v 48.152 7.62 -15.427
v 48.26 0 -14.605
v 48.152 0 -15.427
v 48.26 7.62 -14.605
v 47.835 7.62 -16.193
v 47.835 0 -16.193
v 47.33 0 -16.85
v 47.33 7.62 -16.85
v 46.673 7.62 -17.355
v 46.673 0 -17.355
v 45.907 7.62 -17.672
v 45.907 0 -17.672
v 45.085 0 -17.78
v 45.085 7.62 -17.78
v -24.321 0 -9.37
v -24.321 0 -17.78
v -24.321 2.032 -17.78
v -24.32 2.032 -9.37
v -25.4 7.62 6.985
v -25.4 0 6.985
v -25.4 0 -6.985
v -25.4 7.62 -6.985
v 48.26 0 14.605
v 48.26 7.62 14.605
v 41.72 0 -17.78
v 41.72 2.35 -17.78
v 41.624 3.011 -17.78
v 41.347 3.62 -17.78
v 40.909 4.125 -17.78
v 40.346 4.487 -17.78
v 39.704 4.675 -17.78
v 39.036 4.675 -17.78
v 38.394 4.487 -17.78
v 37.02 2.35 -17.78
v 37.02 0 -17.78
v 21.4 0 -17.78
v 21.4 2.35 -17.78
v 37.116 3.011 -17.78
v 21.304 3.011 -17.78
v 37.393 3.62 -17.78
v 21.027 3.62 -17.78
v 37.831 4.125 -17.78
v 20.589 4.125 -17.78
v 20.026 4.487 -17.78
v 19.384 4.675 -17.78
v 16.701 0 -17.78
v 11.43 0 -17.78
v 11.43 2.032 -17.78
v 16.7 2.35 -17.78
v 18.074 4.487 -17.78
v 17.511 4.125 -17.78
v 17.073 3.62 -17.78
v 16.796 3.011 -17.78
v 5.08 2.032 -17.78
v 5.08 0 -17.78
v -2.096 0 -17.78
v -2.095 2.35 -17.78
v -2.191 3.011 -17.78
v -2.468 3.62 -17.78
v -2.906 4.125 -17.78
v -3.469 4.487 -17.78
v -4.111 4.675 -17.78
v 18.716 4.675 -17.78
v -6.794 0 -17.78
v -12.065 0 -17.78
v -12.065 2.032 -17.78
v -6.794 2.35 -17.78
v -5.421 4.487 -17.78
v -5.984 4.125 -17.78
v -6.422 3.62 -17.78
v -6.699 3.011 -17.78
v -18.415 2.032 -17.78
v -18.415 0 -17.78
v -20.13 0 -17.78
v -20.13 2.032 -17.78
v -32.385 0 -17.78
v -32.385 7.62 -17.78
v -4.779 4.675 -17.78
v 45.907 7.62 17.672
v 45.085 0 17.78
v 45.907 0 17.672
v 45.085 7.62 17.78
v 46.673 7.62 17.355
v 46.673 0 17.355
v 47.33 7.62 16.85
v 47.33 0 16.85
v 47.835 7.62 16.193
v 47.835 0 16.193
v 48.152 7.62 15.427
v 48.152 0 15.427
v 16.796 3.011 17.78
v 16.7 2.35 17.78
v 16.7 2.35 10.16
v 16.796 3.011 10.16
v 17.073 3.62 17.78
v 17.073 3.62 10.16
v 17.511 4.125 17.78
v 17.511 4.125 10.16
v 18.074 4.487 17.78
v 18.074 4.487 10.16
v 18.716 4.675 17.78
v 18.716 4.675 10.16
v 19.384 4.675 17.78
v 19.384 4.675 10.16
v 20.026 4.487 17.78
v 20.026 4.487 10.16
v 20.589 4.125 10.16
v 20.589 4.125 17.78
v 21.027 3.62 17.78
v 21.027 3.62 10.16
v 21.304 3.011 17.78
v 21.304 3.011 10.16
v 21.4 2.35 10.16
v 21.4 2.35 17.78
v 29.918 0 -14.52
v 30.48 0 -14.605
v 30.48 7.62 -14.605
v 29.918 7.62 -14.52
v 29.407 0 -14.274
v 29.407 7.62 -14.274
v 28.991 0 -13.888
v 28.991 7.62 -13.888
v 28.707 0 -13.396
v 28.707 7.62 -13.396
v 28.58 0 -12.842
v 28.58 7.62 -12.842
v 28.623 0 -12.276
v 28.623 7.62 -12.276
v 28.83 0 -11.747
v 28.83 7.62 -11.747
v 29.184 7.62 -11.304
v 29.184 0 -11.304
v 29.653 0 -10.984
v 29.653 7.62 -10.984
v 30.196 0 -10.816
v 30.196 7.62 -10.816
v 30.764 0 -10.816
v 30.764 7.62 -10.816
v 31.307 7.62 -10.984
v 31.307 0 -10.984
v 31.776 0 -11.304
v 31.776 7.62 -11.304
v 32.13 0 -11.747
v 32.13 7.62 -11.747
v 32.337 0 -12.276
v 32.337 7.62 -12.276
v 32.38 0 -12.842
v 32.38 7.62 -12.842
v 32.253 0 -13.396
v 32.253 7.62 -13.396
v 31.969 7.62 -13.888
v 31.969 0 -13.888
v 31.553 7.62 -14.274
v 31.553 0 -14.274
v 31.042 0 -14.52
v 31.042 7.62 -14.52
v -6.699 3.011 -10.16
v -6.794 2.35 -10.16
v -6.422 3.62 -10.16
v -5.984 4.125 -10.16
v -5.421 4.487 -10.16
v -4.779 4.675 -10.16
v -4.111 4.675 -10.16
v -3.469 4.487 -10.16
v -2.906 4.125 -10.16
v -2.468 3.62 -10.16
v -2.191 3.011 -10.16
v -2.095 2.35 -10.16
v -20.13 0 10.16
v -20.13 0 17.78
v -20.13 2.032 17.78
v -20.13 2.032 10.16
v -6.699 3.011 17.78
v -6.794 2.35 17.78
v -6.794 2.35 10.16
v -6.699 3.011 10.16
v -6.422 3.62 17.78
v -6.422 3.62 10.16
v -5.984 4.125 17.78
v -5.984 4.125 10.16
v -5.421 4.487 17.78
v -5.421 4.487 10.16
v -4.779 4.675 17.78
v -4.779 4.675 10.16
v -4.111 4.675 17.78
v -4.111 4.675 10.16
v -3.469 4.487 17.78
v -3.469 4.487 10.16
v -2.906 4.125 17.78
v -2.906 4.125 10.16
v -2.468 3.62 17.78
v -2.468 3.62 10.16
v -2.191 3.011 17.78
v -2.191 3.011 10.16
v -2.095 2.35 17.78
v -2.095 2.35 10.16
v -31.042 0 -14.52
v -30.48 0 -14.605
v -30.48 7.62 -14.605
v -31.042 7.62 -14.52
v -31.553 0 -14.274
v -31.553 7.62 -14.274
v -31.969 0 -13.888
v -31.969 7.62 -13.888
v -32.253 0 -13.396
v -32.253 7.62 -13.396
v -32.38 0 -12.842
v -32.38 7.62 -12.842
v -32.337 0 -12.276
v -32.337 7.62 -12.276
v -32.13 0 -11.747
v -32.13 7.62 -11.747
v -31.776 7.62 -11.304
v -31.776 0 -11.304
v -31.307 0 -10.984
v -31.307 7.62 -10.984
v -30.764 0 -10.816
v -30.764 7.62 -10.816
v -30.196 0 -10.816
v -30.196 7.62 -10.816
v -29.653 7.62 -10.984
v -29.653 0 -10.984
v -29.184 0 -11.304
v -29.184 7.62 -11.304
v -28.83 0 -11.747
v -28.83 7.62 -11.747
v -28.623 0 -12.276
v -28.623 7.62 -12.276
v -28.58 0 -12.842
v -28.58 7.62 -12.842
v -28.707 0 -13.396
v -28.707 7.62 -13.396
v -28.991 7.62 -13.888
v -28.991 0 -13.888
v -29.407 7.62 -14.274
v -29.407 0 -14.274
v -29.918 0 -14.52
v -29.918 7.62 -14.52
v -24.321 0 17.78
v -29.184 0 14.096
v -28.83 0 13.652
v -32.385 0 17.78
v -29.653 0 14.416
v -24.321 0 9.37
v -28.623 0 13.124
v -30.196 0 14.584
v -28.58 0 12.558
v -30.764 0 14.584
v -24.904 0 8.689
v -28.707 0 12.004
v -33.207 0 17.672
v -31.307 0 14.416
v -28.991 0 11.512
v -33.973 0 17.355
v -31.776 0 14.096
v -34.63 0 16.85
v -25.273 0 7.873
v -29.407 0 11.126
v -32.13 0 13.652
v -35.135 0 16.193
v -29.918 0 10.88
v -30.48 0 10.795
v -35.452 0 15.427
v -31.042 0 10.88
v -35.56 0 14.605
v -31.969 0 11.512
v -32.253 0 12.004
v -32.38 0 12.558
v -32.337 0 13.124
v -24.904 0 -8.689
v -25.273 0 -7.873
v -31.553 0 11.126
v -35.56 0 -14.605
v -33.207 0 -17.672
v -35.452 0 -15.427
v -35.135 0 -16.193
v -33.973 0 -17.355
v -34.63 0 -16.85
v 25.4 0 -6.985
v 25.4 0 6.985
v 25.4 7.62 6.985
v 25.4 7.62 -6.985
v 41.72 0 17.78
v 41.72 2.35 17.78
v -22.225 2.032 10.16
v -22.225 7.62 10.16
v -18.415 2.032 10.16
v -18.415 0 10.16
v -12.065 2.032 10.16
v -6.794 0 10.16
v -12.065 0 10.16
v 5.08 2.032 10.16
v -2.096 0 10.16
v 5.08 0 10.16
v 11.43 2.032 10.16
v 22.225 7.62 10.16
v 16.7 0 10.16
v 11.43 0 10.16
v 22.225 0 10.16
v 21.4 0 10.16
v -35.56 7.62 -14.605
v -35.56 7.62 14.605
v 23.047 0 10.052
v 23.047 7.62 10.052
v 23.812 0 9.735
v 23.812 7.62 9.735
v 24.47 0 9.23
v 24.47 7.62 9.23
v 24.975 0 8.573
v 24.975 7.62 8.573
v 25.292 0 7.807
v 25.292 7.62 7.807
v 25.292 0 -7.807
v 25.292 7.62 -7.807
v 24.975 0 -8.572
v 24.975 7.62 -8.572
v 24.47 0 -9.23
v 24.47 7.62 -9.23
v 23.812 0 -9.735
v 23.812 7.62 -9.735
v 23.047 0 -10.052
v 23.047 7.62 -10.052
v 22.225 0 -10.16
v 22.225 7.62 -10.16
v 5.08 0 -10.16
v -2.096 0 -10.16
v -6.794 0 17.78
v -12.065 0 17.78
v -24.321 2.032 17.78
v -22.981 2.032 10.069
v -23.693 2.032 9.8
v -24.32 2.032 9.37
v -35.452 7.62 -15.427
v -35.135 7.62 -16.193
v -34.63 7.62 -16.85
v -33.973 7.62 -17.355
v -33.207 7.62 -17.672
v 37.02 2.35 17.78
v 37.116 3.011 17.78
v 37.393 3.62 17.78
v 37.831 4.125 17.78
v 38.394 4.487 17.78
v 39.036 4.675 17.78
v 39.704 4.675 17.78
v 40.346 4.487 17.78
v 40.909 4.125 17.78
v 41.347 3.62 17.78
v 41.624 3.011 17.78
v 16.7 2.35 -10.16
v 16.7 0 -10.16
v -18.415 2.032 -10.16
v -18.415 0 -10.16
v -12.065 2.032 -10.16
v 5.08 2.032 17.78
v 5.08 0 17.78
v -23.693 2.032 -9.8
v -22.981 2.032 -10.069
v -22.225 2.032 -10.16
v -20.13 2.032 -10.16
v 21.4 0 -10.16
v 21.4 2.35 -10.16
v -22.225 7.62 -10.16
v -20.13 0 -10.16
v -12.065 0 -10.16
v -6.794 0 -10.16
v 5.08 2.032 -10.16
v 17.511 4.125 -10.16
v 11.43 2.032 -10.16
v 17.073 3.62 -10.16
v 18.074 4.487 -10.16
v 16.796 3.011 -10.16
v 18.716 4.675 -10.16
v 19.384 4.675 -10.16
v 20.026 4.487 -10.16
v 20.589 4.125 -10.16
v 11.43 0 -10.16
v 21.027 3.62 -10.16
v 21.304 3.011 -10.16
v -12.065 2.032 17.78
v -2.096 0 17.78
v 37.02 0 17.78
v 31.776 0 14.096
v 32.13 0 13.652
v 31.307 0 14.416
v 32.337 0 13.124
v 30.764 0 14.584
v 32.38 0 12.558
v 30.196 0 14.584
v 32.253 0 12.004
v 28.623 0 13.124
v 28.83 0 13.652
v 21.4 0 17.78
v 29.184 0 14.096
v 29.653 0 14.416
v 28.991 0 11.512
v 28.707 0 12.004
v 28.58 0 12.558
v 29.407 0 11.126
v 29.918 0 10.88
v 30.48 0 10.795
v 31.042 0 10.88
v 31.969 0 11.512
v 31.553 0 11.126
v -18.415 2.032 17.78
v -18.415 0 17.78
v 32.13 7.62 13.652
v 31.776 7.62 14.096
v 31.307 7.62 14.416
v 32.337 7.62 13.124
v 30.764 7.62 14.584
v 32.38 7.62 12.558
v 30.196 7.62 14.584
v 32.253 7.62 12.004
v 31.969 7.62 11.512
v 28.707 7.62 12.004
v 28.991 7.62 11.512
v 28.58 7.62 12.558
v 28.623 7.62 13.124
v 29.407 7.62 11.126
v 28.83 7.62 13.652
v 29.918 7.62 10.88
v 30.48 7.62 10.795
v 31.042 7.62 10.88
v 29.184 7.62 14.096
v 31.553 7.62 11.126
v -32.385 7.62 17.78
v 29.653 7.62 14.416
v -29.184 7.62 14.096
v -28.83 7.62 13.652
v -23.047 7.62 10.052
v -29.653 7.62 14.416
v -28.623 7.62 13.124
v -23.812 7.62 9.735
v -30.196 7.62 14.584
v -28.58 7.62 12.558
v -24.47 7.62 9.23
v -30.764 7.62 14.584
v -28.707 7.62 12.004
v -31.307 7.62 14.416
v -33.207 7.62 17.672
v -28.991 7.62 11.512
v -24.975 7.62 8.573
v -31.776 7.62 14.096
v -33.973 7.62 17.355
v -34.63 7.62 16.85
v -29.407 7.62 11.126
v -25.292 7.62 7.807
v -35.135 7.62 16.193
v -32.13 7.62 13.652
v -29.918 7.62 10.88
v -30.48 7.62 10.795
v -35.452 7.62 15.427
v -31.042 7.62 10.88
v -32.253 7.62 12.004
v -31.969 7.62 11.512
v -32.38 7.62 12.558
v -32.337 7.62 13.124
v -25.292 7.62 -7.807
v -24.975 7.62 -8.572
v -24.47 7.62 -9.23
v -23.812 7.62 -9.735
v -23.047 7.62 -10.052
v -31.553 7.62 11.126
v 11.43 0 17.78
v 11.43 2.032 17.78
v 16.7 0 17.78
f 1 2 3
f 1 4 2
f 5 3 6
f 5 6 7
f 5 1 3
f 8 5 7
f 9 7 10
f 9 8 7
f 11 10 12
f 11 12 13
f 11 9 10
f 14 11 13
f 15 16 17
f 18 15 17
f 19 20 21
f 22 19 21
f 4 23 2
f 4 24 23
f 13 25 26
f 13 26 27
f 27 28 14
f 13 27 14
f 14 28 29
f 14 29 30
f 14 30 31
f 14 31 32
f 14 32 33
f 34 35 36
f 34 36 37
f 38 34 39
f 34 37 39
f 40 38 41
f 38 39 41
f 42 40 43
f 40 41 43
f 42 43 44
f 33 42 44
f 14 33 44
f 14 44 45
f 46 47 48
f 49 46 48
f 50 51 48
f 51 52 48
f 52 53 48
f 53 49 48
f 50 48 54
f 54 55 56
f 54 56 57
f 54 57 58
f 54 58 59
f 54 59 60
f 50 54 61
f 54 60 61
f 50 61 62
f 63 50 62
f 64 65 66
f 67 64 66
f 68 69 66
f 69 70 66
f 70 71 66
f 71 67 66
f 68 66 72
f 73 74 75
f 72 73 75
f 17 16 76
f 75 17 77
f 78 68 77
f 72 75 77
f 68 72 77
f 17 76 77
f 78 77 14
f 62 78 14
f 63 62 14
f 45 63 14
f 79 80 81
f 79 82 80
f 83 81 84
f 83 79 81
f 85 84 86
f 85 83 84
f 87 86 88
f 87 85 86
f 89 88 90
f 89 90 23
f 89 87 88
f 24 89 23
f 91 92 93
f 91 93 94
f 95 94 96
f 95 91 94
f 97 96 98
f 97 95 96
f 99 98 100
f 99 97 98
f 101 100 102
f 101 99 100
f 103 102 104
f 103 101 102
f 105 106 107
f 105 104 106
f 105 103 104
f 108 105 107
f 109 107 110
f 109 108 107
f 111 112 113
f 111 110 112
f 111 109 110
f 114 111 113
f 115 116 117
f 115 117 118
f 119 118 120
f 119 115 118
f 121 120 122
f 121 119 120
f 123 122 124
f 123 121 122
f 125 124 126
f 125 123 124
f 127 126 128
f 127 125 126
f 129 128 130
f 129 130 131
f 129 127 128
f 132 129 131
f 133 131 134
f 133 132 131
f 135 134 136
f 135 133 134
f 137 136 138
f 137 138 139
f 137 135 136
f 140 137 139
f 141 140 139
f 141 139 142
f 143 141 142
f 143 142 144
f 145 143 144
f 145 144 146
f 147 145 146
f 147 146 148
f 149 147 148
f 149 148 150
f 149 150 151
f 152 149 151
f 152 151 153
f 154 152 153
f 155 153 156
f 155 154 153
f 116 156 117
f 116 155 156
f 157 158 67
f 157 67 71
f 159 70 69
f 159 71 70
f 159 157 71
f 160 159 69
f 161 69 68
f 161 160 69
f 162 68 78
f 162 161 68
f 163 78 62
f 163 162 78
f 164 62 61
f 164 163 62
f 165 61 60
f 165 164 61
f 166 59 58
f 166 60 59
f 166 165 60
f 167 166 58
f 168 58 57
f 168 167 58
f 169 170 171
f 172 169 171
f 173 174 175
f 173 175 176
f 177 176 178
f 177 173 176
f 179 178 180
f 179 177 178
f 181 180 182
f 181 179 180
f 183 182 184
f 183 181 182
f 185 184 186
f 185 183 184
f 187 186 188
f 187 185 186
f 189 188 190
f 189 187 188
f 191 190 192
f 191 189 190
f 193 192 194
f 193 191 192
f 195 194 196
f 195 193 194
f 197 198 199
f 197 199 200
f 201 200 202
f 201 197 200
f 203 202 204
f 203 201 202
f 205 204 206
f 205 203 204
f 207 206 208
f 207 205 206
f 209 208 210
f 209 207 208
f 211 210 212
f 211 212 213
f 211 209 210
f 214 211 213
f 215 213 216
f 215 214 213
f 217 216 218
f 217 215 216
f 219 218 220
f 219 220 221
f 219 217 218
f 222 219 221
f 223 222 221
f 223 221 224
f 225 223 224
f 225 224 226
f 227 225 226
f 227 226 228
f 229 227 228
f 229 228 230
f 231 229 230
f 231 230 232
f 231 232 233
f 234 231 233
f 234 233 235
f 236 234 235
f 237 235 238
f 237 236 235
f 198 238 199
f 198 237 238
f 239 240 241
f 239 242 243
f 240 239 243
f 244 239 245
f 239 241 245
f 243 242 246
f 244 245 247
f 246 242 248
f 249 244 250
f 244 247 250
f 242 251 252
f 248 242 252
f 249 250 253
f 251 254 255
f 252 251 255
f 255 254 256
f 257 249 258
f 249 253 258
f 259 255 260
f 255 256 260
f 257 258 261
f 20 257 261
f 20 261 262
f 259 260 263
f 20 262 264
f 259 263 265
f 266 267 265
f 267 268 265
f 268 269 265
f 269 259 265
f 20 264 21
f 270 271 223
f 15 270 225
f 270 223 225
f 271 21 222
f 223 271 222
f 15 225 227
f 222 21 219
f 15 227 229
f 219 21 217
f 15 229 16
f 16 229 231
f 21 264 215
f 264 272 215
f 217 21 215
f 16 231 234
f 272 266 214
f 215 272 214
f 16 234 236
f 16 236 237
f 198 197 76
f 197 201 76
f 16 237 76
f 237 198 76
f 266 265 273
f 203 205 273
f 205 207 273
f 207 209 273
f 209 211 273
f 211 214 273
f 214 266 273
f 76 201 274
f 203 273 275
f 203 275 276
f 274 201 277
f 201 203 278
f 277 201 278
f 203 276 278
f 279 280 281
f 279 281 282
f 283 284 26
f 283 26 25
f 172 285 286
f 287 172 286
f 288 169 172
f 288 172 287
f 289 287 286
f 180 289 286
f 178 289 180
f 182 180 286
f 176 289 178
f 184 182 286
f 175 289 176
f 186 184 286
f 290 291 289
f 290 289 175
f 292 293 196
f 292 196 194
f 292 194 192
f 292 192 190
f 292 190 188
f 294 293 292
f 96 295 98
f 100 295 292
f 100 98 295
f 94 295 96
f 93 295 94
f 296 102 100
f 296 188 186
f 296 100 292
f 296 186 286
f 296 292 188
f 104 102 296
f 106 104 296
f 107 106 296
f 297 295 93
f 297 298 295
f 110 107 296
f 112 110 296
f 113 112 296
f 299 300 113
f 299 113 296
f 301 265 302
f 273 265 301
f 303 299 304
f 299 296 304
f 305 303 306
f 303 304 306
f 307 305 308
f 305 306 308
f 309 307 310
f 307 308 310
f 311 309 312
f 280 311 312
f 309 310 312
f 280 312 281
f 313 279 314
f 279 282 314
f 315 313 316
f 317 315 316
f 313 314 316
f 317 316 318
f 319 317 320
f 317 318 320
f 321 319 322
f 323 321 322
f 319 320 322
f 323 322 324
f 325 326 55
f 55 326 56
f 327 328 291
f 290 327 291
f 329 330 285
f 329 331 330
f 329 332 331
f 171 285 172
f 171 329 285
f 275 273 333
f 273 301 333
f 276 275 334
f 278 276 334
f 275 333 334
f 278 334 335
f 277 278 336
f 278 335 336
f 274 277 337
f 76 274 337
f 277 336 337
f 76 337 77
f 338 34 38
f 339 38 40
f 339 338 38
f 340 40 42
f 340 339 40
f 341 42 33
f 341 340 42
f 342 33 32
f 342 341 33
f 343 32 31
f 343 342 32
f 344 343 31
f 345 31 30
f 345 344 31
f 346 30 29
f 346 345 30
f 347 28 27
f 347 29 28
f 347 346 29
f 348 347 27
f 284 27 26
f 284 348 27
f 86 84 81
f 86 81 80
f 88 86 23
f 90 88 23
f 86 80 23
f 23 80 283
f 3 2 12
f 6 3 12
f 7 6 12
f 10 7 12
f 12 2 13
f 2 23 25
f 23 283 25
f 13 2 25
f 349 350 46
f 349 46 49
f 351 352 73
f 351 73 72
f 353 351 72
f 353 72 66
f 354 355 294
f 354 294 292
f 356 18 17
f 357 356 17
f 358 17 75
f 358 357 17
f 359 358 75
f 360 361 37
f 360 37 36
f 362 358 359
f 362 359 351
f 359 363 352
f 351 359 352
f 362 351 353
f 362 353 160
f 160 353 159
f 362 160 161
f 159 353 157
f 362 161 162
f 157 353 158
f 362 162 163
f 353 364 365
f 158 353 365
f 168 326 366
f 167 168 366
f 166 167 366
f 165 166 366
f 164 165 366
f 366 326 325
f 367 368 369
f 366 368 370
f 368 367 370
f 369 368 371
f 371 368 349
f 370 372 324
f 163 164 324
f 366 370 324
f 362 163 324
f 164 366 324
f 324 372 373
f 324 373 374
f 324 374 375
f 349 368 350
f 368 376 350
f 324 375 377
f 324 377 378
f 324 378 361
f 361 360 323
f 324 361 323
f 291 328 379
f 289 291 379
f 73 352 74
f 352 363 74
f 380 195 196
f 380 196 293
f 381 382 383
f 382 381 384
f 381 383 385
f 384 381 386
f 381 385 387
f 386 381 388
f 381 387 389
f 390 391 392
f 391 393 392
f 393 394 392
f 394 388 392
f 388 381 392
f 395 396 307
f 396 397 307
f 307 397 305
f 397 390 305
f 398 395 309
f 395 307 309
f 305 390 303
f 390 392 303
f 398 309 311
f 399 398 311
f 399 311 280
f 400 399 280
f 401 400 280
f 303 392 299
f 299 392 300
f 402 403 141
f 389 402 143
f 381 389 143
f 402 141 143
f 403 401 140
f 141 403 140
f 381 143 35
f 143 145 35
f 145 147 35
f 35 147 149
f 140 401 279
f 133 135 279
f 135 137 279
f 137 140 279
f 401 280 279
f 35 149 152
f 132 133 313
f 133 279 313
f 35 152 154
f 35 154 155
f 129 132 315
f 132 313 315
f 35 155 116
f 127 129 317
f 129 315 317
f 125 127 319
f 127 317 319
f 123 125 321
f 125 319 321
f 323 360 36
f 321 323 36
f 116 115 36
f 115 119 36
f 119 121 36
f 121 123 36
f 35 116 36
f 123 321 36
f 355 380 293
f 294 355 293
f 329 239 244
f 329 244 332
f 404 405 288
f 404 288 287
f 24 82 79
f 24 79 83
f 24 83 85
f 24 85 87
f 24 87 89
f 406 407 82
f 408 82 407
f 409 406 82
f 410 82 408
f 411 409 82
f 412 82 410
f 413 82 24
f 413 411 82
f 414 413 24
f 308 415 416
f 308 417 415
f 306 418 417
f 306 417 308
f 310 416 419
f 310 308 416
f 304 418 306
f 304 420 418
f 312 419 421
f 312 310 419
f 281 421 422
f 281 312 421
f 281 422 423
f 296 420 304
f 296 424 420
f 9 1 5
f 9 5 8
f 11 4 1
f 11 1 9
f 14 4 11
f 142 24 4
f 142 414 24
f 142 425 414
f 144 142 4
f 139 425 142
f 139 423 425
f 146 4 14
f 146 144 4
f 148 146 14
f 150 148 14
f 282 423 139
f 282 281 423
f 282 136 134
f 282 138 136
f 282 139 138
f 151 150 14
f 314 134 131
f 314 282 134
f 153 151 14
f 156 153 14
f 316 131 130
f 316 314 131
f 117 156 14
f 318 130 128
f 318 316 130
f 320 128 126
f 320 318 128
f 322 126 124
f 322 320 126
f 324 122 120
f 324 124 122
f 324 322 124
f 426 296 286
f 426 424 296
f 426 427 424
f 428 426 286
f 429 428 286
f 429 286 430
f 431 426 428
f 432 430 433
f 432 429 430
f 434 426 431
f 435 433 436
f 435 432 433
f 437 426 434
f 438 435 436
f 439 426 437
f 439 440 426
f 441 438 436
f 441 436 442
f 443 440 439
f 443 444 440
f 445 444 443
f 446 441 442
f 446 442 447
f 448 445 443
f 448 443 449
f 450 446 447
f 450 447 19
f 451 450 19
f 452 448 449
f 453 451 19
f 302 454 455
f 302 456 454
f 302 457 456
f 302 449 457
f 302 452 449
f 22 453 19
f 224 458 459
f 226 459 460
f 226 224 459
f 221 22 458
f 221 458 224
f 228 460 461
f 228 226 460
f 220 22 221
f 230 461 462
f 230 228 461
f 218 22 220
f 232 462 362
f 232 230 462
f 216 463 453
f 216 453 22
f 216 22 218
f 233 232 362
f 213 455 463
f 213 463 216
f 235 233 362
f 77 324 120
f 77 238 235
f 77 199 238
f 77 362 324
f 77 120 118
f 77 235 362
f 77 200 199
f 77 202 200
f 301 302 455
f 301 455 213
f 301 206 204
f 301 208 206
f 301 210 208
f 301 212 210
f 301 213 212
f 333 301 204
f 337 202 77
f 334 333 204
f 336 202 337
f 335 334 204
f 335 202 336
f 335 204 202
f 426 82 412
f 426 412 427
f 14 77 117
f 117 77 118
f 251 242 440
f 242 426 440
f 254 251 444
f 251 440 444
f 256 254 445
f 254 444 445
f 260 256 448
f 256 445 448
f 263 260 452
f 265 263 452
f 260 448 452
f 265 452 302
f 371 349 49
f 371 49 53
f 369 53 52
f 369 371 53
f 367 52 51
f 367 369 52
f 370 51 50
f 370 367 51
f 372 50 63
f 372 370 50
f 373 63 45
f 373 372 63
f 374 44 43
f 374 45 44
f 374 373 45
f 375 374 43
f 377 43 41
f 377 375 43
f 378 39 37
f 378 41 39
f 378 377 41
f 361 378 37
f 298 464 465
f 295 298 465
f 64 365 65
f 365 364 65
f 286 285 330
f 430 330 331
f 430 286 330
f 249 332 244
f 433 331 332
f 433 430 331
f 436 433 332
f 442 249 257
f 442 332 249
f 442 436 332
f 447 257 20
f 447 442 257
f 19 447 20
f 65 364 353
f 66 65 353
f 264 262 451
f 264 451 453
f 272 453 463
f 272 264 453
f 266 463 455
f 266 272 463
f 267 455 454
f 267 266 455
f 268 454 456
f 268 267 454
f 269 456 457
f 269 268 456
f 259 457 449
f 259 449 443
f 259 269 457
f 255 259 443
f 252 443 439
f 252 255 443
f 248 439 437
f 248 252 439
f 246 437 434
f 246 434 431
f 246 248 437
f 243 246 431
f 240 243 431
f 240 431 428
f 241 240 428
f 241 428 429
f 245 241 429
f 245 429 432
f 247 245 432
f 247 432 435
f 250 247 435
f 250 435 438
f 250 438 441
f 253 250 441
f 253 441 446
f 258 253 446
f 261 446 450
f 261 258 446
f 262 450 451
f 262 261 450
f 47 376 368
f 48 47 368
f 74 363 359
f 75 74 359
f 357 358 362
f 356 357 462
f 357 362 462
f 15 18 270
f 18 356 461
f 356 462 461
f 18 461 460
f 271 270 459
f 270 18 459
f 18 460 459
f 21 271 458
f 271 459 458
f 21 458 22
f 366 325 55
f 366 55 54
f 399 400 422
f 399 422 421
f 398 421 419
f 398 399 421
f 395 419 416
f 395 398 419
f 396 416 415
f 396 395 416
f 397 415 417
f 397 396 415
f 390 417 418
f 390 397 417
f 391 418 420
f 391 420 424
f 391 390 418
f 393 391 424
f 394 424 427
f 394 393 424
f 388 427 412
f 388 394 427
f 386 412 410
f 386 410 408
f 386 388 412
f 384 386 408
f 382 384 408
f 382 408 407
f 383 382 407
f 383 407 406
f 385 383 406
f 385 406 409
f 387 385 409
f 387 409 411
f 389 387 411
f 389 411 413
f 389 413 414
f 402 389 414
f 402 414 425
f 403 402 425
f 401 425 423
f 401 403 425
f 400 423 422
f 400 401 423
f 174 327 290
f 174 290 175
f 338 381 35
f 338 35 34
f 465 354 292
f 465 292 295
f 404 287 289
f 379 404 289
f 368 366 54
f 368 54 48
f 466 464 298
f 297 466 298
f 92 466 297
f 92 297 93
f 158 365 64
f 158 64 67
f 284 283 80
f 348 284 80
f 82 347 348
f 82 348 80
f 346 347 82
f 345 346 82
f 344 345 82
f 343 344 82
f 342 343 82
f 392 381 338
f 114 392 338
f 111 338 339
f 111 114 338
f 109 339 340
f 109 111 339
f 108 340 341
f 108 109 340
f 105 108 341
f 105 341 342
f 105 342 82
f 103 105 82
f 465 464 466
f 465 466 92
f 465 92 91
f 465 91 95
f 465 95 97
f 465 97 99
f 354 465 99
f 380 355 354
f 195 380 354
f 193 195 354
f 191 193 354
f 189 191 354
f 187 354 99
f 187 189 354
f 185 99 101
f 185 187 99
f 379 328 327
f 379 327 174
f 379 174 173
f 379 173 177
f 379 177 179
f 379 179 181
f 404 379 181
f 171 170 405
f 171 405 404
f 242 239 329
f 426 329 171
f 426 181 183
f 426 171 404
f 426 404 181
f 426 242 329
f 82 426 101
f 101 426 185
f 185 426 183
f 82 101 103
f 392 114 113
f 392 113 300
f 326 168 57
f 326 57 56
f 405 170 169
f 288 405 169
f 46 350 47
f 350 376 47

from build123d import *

# Parameters (mm, degrees)
SKETCH1_W           = 71.12
SKETCH1_H           = 35.56
SKETCH1_R           = 1.905
SKETCH1_W_2         = 50.8
SKETCH1_H_2         = 20.32
BOSS_EXTRUDE1_DEPTH = 7.62
SKETCH3_W           = 35.56
SKETCH3_H           = 7.62
BOSS_EXTRUDE2_DEPTH = 12.7
SKETCH2_W           = 6.35
SKETCH2_H           = 2.032
SKETCH2_W_2         = 4.191
CUT_EXTRUDE1_DEPTH  = 61.428516447
FILLET1_R           = 3.175


with BuildPart() as part:
    # Sketch1 → Boss-Extrude1 (new body)
    with BuildSketch(Plane(origin=(0, 0, 0), x_dir=(1, 0, 0), z_dir=(0, 1, 0))):
        Rectangle(SKETCH1_W, SKETCH1_H)
        with Locations(Location((30.48, 12.7, 0), (0, 0, 90))):
            Circle(SKETCH1_R, mode=Mode.SUBTRACT)
        with Locations(Location((-30.48, 12.7, 0), (0, 0, 90))):
            Circle(SKETCH1_R, mode=Mode.SUBTRACT)
        with Locations(Location((-30.48, -12.7, 0), (0, 0, 90))):
            Circle(SKETCH1_R, mode=Mode.SUBTRACT)
        with Locations(Location((30.48, -12.7, 0), (0, 0, 90))):
            Circle(SKETCH1_R, mode=Mode.SUBTRACT)
        Rectangle(SKETCH1_W_2, SKETCH1_H_2, mode=Mode.SUBTRACT)
    extrude(amount=BOSS_EXTRUDE1_DEPTH)

    # Sketch3 → Boss-Extrude2 (add)
    with BuildSketch(Plane(origin=(35.56, 0, 0), x_dir=(0, 0, -1), z_dir=(1, 0, 0))):
        with Locations((0, 3.81)):
            Rectangle(SKETCH3_W, SKETCH3_H)
    extrude(amount=BOSS_EXTRUDE2_DEPTH)

    # Sketch2 → Cut-Extrude1 (cut, through all)
    with BuildSketch(Plane.XY.offset(17.78)):
        with BuildLine():
            Line((21.3995, 2.3495), (21.3995, 0))
            Line((21.3995, 0), (16.7005, 0))
            Line((16.7005, 0), (16.7005, 2.3495))
            ThreePointArc((16.7005, 2.3495), (19.05, 4.699), (21.3995, 2.3495))
        make_face()
        with BuildLine():
            Line((-2.0955, 2.3495), (-2.0955, 0))
            Line((-2.0955, 0), (-6.7945, 0))
            Line((-6.7945, 0), (-6.7945, 2.3495))
            ThreePointArc((-6.7945, 2.3495), (-4.445, 4.699), (-2.0955, 2.3495))
        make_face()
        with Locations((8.255, 1.016)):
            Rectangle(SKETCH2_W, SKETCH2_H)
        with Locations((-15.24, 1.016)):
            Rectangle(SKETCH2_W, SKETCH2_H)
        with BuildLine():
            Line((41.7195, 2.3495), (41.7195, 0))
            Line((41.7195, 0), (37.0205, 0))
            Line((37.0205, 0), (37.0205, 2.3495))
            ThreePointArc((37.0205, 2.3495), (39.37, 4.699), (41.7195, 2.3495))
        make_face()
        with Locations((-22.225, 1.016)):
            Rectangle(SKETCH2_W_2, SKETCH2_H)
    extrude(amount=-CUT_EXTRUDE1_DEPTH, mode=Mode.SUBTRACT)

    # Fillet1
    fillet1_edges = [part.edges().sort_by_distance(p)[0] for p in [
        (-35.56, 3.81, -17.78),
        (-35.56, 3.81, 17.78),
        (48.26, 3.81, -17.78),
        (48.26, 3.81, 17.78),
        (25.4, 3.81, 10.16),
        (25.4, 3.81, -10.16),
        (-25.4, 3.81, -10.16),
        (-25.4, 3.81, 10.16),
    ]]
    fillet(fillet1_edges, radius=FILLET1_R)


solid = part.part
